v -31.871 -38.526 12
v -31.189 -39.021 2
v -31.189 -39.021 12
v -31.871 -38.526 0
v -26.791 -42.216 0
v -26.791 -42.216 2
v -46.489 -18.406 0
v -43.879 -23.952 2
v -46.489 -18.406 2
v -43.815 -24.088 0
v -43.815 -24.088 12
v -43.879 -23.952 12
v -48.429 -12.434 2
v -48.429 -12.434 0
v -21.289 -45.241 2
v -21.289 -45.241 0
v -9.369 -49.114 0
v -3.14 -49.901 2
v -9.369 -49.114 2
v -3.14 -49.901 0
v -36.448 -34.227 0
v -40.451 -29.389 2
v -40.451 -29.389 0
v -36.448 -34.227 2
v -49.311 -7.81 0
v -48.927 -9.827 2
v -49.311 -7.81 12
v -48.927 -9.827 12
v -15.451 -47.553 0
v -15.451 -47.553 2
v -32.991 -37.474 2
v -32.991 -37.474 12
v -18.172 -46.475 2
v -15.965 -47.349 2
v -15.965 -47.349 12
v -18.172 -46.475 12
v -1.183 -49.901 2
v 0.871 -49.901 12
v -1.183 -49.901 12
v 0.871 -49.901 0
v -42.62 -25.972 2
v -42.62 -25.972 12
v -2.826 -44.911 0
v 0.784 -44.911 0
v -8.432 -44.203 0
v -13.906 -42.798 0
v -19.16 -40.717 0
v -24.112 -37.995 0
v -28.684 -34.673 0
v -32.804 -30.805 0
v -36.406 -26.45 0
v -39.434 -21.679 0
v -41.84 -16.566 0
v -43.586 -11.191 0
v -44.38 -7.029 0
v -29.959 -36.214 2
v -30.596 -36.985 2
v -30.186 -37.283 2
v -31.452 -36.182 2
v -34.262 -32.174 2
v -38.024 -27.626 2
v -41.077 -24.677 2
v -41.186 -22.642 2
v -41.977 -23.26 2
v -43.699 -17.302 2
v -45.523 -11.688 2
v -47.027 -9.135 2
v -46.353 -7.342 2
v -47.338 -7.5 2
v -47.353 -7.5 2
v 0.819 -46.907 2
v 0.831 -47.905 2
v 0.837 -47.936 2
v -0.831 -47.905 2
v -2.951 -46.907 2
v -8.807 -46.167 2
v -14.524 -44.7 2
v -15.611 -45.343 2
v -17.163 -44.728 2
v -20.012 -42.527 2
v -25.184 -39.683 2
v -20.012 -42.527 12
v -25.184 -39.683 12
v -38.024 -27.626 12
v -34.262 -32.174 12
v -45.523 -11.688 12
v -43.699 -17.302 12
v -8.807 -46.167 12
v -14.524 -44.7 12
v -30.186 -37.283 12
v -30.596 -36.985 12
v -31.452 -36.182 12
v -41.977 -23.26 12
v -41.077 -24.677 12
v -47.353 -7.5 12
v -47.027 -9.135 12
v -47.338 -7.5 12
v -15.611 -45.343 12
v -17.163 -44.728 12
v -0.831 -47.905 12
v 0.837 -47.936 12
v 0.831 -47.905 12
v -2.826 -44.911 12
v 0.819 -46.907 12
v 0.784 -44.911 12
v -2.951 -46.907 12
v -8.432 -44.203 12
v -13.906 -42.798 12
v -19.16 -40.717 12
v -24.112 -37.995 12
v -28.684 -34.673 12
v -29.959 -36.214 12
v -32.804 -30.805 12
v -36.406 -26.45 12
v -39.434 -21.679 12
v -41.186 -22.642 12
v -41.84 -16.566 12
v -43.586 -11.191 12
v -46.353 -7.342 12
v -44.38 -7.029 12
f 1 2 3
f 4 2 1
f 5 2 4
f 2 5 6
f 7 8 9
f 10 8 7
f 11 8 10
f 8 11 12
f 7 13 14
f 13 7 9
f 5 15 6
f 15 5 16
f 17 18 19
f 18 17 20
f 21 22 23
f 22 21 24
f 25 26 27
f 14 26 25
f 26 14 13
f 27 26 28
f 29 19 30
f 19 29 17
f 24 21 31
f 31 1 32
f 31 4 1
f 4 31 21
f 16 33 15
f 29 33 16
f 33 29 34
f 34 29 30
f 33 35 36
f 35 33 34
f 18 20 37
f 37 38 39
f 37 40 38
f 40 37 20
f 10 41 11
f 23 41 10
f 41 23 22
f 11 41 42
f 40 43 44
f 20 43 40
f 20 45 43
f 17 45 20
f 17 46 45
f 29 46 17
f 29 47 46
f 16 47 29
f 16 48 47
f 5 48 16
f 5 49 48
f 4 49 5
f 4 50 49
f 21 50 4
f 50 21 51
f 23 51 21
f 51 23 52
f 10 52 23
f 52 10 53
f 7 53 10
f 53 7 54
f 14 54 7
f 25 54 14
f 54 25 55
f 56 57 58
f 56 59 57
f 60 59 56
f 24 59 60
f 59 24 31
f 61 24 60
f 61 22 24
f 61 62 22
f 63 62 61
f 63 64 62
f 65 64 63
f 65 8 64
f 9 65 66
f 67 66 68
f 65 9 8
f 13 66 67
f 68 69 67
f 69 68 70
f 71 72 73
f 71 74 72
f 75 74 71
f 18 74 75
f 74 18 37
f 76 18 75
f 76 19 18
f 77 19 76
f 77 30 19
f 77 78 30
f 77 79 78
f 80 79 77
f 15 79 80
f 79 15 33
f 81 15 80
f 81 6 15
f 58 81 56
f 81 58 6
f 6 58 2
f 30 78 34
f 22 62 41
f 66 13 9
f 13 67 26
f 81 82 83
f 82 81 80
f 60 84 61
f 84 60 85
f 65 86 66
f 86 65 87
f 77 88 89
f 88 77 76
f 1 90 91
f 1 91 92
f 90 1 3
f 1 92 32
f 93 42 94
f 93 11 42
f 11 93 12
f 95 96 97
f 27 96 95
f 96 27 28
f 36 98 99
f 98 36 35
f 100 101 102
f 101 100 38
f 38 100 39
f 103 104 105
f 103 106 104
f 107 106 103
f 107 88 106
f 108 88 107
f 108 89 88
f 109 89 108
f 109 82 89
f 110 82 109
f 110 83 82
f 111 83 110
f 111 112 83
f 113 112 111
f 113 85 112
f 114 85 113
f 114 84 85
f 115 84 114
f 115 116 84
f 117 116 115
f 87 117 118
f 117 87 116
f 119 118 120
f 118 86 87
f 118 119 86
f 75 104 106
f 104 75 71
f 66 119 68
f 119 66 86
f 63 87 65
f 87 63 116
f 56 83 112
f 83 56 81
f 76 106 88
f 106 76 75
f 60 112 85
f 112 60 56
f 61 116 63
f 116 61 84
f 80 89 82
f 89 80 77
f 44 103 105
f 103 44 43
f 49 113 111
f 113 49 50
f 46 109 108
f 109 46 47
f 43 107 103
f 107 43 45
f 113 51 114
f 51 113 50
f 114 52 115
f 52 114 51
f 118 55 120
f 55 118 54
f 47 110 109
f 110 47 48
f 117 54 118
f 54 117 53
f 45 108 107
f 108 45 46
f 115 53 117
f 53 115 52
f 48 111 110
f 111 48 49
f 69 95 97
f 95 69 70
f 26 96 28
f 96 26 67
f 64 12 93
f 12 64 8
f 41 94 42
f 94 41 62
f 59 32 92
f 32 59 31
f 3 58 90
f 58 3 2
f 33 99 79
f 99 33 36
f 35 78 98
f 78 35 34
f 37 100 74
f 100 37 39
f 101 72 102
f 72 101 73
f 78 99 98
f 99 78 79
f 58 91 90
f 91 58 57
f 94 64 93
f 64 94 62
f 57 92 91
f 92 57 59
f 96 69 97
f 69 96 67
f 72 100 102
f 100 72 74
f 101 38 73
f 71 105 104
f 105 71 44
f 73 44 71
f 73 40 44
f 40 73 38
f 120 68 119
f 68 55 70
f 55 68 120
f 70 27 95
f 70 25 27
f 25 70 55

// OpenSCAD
$fn=50;

shelfWidth=100;

module shelf()
{
	
	difference()
	{
		union()
		{
		cylinder(d=shelfWidth,h=2);
		cylinder(d=shelfWidth-6,h=12);
		}
		cylinder(d=shelfWidth-10,h=12);
	}
}

module rod()
{
	translate([0,0,6]) cube([shelfWidth+4,15,12],center=true);
}

module rods()
{
	difference()
	{
		cylinder(d=(shelfWidth),h=12);
		cylinder(d=shelfWidth-4,h=12);
		for(i=[0:20:160])
		{
			rotate([0,0,i]) rod();
		}
	}
}

module cut()
{
	rotate([0,0,1]) translate([0,shelfWidth/2 * -1,0]) cube([shelfWidth,shelfWidth,12]);
	rotate([0,0,9]) translate([shelfWidth/2 * -1,0,0]) cube([shelfWidth,shelfWidth,12]);
}

difference()
{
union()
{
	shelf();
	rods();
}
cut();
}
